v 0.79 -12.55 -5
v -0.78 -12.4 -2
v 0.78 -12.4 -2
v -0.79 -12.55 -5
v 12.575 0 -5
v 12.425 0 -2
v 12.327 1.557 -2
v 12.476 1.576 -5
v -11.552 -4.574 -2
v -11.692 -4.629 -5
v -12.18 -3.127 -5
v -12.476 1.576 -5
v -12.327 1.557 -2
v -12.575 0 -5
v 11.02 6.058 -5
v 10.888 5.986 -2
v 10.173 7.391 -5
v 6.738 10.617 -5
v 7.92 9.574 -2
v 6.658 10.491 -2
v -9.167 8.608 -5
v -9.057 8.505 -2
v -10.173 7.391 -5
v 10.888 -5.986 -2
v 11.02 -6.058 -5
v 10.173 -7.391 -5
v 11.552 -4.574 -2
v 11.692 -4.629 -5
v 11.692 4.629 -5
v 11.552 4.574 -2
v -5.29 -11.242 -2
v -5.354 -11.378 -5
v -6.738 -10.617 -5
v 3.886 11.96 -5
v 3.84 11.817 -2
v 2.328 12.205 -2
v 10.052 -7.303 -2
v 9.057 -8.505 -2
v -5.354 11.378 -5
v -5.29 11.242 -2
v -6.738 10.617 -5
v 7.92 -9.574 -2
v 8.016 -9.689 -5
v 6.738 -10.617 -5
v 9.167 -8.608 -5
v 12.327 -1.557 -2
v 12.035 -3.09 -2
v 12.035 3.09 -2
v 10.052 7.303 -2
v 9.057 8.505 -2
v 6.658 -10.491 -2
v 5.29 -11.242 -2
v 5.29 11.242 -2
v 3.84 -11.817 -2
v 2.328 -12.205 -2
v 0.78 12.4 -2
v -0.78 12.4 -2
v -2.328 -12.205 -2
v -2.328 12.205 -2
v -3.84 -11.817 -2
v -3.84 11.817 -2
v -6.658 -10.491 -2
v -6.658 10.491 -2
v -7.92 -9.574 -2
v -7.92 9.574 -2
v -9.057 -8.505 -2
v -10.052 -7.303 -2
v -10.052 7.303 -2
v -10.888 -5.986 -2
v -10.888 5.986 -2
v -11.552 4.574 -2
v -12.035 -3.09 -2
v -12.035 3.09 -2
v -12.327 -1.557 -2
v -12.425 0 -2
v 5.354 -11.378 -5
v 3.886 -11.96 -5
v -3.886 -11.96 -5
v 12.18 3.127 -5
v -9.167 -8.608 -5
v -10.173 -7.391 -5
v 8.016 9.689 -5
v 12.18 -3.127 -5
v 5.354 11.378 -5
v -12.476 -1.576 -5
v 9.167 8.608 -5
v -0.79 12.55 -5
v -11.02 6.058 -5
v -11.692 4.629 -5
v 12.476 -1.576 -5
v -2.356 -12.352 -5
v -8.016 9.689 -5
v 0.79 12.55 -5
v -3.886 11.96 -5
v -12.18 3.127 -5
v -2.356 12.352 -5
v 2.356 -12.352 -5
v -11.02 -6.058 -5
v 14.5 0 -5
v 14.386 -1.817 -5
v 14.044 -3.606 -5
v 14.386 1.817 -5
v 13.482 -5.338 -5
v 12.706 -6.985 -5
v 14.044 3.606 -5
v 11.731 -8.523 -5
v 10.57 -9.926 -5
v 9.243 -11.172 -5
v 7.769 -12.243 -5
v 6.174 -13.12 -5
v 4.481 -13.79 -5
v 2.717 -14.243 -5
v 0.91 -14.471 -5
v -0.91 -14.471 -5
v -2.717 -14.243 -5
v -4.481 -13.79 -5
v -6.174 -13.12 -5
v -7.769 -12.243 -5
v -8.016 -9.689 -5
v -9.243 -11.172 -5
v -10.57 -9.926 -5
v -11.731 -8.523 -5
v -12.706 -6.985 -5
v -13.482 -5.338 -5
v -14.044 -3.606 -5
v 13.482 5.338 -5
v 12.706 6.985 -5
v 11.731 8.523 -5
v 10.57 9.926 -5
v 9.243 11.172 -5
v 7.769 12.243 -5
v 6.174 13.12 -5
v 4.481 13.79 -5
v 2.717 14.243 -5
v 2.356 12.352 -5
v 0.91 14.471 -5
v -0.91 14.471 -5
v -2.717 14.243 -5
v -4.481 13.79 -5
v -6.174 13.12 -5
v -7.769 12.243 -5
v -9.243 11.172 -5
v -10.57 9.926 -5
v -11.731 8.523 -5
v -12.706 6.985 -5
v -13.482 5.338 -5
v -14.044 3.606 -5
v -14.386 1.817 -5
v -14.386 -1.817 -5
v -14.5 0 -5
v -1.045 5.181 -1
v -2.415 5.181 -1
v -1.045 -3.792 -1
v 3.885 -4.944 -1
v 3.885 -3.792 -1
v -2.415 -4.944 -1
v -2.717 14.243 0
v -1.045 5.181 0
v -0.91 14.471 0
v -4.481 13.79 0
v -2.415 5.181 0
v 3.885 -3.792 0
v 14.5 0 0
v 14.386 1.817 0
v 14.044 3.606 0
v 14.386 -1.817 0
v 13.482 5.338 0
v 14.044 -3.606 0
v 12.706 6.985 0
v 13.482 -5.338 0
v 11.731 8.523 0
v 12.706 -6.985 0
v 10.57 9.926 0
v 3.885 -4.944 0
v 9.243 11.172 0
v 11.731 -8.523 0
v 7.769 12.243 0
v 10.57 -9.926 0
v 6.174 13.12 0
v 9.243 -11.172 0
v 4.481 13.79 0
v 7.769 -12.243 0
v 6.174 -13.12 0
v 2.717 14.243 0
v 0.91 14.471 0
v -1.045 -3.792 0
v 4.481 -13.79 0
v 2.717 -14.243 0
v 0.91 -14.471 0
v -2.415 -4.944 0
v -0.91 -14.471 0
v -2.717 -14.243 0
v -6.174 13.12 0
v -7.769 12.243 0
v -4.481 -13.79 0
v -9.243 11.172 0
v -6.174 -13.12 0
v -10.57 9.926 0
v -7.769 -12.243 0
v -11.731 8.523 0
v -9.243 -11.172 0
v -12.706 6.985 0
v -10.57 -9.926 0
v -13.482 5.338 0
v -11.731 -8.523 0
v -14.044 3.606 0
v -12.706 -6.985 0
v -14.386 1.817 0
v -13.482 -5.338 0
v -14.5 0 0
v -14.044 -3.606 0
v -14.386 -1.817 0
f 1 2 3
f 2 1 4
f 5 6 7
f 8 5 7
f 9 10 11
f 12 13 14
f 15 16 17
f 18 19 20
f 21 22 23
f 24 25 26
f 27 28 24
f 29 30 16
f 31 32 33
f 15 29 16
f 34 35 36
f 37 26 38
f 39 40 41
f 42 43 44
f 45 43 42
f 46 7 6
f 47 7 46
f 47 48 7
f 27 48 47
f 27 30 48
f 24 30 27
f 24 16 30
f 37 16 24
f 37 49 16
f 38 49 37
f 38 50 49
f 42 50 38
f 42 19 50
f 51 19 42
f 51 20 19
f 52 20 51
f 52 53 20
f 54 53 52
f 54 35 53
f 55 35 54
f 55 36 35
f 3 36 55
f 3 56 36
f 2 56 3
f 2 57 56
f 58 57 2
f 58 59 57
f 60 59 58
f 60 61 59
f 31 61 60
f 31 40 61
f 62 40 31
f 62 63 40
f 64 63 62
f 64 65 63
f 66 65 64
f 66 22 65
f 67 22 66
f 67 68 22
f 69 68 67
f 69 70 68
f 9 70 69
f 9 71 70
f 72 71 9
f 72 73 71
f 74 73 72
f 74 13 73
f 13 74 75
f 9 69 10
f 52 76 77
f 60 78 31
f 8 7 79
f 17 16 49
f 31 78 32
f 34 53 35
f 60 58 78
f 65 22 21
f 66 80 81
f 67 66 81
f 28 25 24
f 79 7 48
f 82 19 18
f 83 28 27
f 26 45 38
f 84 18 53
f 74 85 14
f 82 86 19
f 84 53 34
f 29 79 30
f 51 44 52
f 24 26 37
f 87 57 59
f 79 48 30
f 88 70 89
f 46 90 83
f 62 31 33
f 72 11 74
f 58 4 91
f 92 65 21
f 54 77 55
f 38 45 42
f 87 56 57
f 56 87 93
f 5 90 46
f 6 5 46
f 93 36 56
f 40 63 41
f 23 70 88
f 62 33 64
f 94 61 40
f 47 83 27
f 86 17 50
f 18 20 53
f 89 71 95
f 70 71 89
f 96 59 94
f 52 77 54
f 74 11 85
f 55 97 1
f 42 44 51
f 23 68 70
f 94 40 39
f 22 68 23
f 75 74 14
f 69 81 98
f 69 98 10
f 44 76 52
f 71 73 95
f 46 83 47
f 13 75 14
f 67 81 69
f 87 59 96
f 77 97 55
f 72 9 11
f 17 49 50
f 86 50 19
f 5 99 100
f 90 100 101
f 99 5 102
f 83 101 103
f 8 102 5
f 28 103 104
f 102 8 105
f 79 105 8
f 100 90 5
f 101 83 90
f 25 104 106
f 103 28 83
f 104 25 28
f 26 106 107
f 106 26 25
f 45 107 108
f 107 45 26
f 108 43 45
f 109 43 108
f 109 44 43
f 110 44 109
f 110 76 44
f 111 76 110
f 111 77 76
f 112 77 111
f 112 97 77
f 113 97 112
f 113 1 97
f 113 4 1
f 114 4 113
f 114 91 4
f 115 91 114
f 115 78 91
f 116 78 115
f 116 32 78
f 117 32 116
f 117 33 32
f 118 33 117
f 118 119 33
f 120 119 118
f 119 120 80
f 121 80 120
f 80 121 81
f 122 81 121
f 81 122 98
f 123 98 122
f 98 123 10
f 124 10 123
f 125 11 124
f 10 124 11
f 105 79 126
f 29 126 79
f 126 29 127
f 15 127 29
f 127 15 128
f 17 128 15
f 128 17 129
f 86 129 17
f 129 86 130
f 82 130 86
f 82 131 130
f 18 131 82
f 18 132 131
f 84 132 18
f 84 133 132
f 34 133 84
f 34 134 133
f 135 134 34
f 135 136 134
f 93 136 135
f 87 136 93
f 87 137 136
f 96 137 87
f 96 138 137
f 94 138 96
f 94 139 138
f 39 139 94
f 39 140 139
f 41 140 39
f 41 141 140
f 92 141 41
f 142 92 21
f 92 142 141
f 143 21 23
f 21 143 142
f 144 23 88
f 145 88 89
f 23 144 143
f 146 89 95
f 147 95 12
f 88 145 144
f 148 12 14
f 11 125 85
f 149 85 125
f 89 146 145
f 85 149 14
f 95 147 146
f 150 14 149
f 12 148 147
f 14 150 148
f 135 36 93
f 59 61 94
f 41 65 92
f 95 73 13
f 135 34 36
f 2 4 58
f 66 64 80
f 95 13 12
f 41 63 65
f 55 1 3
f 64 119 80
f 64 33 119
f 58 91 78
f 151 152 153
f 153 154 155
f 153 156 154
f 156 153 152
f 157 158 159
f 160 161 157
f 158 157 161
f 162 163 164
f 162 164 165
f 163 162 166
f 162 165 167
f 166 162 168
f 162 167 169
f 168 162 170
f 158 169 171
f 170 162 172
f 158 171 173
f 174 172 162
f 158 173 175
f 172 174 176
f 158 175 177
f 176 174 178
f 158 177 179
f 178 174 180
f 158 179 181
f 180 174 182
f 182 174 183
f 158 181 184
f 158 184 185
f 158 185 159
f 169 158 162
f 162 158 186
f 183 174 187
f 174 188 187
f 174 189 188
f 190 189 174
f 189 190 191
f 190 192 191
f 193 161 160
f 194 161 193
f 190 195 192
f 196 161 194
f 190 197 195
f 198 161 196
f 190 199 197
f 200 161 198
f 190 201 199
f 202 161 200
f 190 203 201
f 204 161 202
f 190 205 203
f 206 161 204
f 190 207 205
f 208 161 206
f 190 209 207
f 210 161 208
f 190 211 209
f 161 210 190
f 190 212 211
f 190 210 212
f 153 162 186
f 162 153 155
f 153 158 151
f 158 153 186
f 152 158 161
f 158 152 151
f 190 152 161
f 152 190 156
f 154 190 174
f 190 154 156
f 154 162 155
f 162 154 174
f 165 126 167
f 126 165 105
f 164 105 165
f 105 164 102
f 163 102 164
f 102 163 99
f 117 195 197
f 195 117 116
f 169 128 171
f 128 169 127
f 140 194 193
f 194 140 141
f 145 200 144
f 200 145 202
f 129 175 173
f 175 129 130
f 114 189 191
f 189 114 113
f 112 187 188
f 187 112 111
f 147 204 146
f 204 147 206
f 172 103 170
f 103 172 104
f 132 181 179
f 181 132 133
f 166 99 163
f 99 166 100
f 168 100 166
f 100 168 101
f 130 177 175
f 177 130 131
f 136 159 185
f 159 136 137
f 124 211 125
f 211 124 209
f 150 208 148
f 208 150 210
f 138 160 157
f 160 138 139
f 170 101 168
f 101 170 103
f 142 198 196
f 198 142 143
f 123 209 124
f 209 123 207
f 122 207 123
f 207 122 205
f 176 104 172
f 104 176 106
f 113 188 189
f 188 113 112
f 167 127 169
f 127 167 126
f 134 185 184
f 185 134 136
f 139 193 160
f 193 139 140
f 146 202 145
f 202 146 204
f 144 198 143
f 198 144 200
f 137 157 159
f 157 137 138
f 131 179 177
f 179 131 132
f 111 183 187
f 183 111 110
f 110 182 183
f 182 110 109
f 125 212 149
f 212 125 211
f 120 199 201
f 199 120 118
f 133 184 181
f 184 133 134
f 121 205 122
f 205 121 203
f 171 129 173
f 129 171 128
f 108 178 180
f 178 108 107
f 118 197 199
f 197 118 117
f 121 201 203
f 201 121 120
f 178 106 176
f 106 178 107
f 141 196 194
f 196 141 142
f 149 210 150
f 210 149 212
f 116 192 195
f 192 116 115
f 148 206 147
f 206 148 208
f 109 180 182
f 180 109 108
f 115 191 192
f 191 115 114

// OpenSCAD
$fn = 50;

difference() {
	union() {
		translate(v = [0, 0, -5.0]) {
			cylinder(h = 5, r = 14.5);
		}
	}
	union() {
		#translate(v = [0, 0, -5.0]) {
			cylinder(h = 3, r1 = 12.575, r2 = 12.425);
		}
		translate(v = [0, 0, -1]) {
			linear_extrude(height = 1) {
				text(font = "Impact", halign = "center", size = 10, text = "L", valign = "center");
			}
		}
	}
}
